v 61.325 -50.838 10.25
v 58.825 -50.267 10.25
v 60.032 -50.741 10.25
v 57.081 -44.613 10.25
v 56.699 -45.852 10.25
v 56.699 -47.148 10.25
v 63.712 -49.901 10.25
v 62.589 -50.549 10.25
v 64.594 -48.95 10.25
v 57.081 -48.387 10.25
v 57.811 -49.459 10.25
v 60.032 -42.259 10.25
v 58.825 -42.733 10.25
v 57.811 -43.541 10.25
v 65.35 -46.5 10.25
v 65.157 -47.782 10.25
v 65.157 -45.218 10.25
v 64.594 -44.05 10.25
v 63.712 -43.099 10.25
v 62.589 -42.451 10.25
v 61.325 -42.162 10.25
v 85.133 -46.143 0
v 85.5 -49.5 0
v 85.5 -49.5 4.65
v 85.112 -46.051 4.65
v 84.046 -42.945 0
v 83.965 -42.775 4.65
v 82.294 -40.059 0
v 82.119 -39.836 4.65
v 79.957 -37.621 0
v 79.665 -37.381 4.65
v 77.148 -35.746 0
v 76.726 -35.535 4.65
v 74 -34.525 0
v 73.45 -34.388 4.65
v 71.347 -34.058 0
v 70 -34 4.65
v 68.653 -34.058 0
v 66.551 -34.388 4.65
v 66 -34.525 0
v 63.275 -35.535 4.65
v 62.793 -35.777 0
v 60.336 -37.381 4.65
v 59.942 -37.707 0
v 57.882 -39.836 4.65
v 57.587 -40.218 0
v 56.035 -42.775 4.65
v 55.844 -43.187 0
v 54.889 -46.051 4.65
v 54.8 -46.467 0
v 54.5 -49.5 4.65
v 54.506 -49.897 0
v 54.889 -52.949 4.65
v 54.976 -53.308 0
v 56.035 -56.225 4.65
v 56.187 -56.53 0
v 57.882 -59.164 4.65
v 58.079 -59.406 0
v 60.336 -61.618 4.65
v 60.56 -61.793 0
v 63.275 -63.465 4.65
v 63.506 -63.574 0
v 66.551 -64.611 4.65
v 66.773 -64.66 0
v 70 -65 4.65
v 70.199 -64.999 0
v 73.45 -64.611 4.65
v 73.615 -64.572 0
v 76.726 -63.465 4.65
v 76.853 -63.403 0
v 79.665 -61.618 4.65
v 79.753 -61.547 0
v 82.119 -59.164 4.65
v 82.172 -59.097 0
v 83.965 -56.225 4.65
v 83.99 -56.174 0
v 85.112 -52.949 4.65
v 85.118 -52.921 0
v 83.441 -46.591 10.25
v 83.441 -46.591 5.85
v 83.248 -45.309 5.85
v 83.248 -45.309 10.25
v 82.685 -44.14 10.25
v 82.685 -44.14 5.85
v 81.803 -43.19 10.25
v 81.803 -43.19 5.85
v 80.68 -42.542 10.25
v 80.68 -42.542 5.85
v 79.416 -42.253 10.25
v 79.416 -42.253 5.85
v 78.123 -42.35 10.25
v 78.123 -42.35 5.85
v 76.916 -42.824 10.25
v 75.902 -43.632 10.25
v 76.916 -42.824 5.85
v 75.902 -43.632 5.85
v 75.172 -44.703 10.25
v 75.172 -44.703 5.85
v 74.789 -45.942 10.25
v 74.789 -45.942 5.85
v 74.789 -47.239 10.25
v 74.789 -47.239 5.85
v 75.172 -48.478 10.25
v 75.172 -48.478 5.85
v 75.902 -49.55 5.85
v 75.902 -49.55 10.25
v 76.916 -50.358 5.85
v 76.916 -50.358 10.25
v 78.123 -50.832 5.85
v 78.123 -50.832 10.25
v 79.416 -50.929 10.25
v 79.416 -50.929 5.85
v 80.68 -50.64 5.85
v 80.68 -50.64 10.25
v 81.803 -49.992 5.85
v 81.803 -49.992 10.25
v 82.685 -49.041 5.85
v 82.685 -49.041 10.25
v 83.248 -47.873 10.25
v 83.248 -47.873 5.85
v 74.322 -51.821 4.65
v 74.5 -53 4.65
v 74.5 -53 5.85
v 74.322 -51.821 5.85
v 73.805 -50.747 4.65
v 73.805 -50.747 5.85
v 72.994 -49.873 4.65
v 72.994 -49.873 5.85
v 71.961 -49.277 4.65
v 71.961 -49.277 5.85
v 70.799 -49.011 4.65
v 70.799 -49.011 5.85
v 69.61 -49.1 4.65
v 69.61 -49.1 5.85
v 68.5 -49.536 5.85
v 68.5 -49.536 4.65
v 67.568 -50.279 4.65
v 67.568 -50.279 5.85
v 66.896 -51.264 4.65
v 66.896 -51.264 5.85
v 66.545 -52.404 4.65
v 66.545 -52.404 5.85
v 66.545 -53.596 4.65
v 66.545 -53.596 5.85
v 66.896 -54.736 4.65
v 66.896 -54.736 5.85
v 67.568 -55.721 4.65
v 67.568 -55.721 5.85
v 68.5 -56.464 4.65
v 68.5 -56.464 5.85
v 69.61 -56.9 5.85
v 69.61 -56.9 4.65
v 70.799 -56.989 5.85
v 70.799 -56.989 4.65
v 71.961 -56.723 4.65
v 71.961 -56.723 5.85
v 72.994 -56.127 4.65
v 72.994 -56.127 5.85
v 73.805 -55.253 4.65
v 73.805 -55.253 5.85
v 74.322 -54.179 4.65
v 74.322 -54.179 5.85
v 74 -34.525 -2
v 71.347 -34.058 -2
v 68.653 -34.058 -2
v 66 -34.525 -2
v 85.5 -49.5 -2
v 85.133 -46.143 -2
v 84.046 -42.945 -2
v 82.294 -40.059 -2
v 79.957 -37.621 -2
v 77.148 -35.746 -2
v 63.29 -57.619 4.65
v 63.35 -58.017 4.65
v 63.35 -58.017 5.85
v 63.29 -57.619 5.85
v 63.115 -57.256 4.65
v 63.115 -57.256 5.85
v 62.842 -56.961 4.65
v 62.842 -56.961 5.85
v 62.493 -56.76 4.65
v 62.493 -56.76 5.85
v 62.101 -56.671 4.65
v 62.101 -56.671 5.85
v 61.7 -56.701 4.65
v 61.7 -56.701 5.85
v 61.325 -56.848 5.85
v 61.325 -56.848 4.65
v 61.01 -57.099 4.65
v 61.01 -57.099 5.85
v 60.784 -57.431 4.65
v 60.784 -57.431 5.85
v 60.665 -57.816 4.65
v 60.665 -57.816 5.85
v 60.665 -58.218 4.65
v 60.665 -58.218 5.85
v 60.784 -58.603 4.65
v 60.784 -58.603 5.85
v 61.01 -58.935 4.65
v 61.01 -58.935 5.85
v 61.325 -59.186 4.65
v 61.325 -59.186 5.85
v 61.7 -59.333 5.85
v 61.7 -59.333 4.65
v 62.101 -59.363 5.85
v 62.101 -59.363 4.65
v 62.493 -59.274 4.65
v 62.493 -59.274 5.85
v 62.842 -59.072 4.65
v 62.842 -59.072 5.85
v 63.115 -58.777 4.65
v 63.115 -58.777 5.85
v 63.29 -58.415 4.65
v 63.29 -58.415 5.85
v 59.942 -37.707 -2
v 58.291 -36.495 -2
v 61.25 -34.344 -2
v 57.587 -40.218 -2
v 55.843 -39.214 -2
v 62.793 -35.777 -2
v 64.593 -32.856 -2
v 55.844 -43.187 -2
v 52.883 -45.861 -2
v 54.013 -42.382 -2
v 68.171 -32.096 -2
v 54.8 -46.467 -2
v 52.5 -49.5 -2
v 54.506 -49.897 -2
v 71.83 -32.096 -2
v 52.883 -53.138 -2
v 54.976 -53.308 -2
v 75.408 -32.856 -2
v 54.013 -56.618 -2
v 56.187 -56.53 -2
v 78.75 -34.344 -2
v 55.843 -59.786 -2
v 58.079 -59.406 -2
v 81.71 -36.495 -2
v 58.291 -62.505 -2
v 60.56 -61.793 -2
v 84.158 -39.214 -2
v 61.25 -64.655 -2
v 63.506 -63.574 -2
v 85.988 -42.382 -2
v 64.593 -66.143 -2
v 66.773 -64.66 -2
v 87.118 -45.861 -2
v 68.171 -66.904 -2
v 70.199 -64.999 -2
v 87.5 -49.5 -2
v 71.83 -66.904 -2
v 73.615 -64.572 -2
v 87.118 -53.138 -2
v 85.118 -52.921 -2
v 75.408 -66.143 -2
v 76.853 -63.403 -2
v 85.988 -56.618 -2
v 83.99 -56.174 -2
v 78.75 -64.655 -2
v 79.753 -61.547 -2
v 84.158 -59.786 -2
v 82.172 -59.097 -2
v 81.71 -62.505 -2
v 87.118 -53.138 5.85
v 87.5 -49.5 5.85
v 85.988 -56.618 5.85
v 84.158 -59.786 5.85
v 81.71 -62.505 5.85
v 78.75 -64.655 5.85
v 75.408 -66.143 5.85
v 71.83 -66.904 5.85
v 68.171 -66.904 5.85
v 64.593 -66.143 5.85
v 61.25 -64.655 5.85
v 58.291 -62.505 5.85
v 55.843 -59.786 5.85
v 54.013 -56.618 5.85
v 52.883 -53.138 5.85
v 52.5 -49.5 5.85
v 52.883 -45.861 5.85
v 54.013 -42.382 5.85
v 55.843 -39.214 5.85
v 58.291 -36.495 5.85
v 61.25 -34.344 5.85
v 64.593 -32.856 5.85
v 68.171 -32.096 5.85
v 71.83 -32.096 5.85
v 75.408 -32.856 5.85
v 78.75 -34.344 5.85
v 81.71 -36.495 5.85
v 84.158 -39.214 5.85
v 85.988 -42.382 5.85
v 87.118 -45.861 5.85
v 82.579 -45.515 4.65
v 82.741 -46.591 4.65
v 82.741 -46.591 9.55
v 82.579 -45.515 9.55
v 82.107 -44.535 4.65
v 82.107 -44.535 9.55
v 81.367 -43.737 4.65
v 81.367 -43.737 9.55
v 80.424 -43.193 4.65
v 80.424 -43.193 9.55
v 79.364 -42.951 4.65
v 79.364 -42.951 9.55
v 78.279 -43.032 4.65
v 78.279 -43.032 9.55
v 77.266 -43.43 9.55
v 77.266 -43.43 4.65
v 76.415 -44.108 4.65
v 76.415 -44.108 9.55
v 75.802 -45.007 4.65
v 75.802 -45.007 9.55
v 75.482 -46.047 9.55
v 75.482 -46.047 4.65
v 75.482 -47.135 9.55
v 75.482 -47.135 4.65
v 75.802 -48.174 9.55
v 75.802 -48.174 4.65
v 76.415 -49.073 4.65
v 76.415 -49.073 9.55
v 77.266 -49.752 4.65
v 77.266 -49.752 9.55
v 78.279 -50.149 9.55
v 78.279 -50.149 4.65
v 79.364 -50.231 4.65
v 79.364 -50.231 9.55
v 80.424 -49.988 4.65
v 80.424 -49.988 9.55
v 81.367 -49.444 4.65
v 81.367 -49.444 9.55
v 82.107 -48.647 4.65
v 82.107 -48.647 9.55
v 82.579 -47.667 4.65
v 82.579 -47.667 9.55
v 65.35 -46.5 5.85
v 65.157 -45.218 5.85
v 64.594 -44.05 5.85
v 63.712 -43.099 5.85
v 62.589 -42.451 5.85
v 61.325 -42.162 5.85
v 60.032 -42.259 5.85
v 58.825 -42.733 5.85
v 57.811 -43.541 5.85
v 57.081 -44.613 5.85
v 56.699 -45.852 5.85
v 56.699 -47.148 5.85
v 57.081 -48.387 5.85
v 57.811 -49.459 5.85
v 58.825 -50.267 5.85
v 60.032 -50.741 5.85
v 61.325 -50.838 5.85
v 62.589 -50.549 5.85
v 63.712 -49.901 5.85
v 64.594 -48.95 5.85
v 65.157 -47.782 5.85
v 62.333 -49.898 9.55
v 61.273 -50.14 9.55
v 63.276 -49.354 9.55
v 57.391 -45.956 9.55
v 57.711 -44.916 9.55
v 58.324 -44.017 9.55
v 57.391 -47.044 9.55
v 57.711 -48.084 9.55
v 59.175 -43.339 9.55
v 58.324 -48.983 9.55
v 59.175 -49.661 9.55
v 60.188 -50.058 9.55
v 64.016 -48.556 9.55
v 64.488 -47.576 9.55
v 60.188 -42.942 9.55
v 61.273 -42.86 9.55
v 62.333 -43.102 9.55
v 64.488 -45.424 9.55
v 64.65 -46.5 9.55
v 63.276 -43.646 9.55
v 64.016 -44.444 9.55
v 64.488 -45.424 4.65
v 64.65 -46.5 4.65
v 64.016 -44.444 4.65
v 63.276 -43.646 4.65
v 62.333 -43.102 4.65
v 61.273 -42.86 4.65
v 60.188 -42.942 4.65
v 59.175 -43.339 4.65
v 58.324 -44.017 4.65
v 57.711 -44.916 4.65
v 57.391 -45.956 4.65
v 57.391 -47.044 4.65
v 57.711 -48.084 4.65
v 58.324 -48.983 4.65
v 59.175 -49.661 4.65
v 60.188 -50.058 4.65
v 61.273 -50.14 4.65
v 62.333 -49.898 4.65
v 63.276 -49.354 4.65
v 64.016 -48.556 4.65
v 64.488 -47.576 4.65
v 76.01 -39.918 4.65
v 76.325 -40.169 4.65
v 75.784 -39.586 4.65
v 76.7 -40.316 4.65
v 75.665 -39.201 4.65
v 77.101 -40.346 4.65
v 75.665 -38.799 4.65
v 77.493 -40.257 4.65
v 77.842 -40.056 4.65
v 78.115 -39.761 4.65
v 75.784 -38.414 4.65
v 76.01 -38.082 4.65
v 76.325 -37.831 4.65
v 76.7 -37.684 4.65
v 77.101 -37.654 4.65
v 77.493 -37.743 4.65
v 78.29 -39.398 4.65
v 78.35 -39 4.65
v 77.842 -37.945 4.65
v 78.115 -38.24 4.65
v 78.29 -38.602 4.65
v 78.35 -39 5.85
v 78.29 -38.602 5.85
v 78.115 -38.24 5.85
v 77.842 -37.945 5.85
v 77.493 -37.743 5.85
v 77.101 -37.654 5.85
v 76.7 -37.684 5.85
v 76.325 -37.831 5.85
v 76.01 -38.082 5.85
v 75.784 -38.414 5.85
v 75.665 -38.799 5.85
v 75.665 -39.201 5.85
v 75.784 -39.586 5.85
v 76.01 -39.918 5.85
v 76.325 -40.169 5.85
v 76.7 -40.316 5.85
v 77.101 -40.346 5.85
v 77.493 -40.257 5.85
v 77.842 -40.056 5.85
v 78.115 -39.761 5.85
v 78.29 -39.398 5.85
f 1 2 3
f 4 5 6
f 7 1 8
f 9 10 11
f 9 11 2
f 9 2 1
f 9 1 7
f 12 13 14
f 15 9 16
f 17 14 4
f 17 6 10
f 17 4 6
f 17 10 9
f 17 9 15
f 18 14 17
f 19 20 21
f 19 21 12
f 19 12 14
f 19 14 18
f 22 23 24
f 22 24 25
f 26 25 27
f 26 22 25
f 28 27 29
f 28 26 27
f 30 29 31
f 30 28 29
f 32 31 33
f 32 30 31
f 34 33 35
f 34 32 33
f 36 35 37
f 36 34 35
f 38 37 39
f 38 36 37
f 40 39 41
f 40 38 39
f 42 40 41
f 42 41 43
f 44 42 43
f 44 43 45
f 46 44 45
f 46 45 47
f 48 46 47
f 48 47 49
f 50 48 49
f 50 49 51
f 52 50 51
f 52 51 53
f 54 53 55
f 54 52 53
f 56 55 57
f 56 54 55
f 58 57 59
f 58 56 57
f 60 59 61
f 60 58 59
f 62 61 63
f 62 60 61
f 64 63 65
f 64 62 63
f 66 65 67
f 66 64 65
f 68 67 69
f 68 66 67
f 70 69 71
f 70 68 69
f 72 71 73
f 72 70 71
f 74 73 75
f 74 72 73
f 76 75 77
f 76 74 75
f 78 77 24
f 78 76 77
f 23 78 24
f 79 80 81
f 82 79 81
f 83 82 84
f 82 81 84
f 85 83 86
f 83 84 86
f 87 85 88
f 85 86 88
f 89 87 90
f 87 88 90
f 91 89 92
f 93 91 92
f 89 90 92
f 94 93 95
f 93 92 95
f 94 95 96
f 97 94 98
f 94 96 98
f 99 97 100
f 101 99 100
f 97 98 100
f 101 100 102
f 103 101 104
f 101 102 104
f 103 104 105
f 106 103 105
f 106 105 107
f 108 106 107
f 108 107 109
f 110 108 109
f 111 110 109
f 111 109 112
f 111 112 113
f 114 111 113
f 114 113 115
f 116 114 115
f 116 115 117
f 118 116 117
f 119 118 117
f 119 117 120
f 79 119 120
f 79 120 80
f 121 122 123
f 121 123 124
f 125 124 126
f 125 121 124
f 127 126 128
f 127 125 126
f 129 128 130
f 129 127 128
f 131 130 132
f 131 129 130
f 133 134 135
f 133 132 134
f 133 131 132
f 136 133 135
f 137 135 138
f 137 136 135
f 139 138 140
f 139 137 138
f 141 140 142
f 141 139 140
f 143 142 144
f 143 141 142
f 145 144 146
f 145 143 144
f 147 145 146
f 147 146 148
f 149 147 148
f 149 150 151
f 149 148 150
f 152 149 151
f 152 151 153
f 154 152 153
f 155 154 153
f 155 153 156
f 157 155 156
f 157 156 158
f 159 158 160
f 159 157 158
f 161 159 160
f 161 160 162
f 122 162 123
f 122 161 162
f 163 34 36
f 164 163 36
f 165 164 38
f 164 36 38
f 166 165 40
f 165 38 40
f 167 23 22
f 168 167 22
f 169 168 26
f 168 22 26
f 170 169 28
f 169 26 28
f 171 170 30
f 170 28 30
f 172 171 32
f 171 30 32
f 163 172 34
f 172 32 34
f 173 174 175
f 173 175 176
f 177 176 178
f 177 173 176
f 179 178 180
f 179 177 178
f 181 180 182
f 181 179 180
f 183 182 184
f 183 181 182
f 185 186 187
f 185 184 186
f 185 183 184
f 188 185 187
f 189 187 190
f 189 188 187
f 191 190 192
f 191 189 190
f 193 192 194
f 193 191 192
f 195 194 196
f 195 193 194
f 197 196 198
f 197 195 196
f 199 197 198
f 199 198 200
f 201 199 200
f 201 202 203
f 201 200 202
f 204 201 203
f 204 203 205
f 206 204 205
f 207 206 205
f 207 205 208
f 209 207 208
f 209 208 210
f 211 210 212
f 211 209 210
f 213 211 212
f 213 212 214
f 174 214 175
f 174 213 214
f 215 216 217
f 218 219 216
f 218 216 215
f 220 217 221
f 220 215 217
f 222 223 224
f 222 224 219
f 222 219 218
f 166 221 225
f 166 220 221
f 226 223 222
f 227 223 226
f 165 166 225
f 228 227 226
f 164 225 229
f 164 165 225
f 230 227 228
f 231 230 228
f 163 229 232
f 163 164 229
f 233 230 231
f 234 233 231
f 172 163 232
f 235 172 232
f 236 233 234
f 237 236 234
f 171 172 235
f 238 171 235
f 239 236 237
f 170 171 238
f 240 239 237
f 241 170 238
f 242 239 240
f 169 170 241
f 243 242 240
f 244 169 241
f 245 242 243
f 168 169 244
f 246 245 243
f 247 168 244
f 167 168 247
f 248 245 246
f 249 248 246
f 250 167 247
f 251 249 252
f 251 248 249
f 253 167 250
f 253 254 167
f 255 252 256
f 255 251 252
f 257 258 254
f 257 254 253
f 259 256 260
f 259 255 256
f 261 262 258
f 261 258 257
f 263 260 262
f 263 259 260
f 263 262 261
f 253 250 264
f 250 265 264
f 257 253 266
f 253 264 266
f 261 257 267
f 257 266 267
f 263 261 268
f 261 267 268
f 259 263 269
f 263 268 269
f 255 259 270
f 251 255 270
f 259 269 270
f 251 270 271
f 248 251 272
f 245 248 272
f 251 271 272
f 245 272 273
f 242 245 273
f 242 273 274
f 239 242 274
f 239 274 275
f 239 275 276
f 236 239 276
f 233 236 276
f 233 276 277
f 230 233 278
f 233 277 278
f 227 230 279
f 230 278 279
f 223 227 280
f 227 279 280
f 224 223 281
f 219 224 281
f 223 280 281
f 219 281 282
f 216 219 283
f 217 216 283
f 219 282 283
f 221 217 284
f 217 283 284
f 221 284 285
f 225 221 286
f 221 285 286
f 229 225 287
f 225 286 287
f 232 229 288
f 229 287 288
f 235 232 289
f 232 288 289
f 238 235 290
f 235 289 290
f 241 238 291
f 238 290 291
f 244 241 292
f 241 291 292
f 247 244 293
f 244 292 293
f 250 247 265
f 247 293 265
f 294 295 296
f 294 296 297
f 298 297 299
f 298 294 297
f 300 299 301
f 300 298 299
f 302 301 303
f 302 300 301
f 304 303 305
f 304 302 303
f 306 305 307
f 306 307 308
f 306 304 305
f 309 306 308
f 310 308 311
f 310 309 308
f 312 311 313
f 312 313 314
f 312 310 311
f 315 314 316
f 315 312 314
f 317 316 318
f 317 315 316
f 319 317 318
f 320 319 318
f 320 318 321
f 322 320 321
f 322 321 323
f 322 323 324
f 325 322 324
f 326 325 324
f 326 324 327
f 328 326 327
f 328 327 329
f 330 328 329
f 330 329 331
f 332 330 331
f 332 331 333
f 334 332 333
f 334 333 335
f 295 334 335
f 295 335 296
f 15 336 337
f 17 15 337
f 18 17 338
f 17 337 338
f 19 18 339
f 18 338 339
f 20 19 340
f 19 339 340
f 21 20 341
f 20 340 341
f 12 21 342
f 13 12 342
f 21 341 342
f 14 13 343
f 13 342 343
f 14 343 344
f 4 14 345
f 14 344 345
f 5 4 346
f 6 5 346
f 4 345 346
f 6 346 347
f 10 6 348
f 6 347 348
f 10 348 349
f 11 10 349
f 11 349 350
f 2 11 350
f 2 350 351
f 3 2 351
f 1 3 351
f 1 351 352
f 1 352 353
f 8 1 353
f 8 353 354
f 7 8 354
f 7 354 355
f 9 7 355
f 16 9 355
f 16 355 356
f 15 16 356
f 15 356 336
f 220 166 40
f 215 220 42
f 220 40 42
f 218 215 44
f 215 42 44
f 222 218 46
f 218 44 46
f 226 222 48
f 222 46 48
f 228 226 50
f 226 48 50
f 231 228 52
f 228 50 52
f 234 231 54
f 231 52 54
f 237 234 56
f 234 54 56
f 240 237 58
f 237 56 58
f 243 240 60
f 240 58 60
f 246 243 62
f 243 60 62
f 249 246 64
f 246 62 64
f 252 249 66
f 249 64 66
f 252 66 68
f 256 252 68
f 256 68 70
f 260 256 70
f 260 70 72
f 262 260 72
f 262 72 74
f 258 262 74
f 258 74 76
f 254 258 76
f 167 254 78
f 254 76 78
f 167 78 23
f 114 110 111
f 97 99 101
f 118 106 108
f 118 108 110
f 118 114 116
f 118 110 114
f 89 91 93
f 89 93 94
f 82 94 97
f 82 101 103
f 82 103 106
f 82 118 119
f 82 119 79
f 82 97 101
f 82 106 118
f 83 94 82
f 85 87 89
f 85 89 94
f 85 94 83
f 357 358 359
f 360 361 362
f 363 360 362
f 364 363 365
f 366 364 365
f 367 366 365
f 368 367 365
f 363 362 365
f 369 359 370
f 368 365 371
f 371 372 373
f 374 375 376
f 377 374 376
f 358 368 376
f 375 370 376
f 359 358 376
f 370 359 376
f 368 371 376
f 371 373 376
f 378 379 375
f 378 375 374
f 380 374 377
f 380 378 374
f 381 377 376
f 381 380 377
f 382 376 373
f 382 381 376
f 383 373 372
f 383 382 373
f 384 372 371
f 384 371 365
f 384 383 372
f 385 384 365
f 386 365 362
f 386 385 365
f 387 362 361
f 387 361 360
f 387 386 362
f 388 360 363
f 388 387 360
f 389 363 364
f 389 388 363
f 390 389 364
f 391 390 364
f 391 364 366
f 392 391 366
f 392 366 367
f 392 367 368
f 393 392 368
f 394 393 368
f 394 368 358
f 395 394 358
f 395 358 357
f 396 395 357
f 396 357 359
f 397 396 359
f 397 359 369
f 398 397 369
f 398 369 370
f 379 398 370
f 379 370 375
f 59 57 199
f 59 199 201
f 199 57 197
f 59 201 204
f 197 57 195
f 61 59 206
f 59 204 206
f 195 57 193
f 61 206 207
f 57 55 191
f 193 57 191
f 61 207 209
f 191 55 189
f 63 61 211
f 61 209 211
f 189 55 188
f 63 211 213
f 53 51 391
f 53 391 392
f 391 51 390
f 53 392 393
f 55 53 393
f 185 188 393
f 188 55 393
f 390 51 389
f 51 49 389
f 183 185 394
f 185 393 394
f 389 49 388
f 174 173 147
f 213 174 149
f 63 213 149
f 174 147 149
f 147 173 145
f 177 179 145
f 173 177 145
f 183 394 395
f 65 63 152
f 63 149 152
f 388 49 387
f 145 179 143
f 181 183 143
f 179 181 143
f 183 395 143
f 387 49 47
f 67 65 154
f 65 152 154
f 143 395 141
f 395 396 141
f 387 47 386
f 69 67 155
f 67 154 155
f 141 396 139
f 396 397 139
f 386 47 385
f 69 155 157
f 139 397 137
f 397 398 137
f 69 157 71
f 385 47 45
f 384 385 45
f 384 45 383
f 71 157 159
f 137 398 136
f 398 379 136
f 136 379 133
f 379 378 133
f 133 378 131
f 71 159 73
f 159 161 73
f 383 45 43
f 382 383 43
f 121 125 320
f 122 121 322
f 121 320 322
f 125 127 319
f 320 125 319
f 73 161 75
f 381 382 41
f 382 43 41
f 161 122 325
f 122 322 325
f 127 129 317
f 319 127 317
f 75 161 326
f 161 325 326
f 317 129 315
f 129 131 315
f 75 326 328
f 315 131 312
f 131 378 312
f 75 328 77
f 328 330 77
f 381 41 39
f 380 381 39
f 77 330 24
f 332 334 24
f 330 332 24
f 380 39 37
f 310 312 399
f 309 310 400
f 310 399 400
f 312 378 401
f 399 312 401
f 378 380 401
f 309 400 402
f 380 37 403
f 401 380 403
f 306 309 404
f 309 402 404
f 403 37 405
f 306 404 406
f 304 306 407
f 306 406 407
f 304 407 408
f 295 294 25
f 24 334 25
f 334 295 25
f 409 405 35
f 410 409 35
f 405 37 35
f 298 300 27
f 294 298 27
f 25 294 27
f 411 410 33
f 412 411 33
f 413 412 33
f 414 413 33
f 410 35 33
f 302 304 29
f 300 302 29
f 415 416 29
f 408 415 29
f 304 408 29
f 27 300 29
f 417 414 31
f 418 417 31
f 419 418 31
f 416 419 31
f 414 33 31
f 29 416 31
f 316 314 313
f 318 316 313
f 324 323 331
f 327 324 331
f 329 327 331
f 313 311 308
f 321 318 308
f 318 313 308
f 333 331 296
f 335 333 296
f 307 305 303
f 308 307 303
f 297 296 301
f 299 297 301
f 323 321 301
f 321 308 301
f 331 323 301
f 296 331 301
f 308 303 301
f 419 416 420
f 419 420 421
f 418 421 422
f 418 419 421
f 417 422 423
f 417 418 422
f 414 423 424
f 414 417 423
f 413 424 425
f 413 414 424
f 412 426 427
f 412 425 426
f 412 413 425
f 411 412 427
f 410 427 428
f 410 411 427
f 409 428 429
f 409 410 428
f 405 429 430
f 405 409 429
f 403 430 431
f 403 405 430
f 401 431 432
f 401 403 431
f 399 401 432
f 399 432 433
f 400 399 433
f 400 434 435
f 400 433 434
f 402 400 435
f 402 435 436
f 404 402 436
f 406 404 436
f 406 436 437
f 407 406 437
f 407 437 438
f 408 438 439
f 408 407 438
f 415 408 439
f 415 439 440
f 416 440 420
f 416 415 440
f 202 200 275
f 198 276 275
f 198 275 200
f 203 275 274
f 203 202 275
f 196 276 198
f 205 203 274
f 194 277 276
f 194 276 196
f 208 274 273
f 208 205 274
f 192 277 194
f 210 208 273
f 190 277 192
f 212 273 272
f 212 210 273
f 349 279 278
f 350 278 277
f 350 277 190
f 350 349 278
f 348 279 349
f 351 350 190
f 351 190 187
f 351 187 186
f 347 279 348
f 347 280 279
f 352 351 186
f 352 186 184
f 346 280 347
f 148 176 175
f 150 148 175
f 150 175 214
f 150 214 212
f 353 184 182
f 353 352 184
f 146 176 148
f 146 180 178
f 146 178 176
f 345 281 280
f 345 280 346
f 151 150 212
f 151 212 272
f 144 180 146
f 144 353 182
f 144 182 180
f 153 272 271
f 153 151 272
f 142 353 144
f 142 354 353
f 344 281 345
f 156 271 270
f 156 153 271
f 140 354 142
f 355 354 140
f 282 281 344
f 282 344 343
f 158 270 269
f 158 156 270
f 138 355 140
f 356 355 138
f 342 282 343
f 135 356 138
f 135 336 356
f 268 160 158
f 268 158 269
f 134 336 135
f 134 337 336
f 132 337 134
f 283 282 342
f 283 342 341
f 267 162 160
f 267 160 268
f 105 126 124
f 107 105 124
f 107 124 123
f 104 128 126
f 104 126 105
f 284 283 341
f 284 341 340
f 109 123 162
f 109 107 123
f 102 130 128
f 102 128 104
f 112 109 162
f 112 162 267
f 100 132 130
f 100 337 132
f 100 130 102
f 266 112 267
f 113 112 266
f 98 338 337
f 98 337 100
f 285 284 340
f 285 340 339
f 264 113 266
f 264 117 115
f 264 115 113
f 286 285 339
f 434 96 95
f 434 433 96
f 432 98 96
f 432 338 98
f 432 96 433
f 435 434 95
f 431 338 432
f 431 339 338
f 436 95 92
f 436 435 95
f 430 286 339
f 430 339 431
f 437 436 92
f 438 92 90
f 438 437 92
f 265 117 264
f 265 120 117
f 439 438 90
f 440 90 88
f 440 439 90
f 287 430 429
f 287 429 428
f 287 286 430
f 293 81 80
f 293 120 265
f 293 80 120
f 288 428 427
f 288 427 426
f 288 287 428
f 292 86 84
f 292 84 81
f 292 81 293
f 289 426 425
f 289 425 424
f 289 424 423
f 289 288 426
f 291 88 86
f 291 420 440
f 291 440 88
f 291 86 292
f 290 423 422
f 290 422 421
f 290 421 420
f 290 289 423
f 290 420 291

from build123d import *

# Parameters (mm, degrees)
SKETCH5_R           = 17.5
BOSS_EXTRUDE1_DEPTH = 5.85
SKETCH8_R           = 4.35
BOSS_EXTRUDE2_DEPTH = 10.25
SKETCH13_R          = 4
SKETCH13_R_2        = 1.35
SKETCH13_R_3        = 3.65
CUT_EXTRUDE1_DEPTH  = 9.55
SKETCH14_R          = 15.5
CUT_EXTRUDE2_DEPTH  = 4.65
BOSS_EXTRUDE3_START = 2
SKETCH15_R          = 17.5
BOSS_EXTRUDE3_DEPTH = 2


with BuildPart() as part:
    # Sketch5 → Boss-Extrude1 (new body)
    with BuildSketch(Plane.XY):
        with Locations((70.000455679, -49.499827976)):
            Circle(SKETCH5_R)
    extrude(amount=BOSS_EXTRUDE1_DEPTH)

    # Sketch8 → Boss-Extrude2 (add)
    with BuildSketch(Plane.XY):
        with Locations((79.090811, -46.590809)):
            Circle(SKETCH8_R)
        with Locations((61, -46.5)):
            Circle(SKETCH8_R)
    extrude(amount=BOSS_EXTRUDE2_DEPTH)

    # Sketch13 → Cut-Extrude1 (cut)
    with BuildSketch(Plane.XY):
        with Locations((70.5, -53)):
            Circle(SKETCH13_R)
        with Locations((77, -39.000037614)):
            Circle(SKETCH13_R_2)
        with Locations((62, -58.016959066)):
            Circle(SKETCH13_R_2)
        with Locations((79.090811, -46.590809)):
            Circle(SKETCH13_R_3)
        with Locations((61, -46.5)):
            Circle(SKETCH13_R_3)
    extrude(amount=CUT_EXTRUDE1_DEPTH, mode=Mode.SUBTRACT)

    # Sketch14 → Cut-Extrude2 (cut)
    with BuildSketch(Plane.XY):
        with Locations((70.000455679, -49.499827976)):
            Circle(SKETCH14_R)
    extrude(amount=CUT_EXTRUDE2_DEPTH, mode=Mode.SUBTRACT)

    # Sketch15 → Boss-Extrude3 (add)
    with BuildSketch(Plane(origin=(0, 0, 0), x_dir=(1, 0, 0), z_dir=(0, 0, -1)).offset(BOSS_EXTRUDE3_START)):
        with Locations((70.000455679, 49.499827976)):
            Circle(SKETCH15_R)
        with BuildLine():
            ThreePointArc((85.500455679, 49.499827976), (82.293609036, 40.059045139), (74.000019478, 34.524732336))
            ThreePointArc((74.000019478, 34.524732336), (70.000004184, 33.999827982), (66.000019478, 34.524965365))
            ThreePointArc((66.000019478, 34.524965365), (60.560030931, 61.793256324), (85.500455679, 49.499827976))
        make_face(mode=Mode.SUBTRACT)
    extrude(amount=-BOSS_EXTRUDE3_DEPTH)


solid = part.part
